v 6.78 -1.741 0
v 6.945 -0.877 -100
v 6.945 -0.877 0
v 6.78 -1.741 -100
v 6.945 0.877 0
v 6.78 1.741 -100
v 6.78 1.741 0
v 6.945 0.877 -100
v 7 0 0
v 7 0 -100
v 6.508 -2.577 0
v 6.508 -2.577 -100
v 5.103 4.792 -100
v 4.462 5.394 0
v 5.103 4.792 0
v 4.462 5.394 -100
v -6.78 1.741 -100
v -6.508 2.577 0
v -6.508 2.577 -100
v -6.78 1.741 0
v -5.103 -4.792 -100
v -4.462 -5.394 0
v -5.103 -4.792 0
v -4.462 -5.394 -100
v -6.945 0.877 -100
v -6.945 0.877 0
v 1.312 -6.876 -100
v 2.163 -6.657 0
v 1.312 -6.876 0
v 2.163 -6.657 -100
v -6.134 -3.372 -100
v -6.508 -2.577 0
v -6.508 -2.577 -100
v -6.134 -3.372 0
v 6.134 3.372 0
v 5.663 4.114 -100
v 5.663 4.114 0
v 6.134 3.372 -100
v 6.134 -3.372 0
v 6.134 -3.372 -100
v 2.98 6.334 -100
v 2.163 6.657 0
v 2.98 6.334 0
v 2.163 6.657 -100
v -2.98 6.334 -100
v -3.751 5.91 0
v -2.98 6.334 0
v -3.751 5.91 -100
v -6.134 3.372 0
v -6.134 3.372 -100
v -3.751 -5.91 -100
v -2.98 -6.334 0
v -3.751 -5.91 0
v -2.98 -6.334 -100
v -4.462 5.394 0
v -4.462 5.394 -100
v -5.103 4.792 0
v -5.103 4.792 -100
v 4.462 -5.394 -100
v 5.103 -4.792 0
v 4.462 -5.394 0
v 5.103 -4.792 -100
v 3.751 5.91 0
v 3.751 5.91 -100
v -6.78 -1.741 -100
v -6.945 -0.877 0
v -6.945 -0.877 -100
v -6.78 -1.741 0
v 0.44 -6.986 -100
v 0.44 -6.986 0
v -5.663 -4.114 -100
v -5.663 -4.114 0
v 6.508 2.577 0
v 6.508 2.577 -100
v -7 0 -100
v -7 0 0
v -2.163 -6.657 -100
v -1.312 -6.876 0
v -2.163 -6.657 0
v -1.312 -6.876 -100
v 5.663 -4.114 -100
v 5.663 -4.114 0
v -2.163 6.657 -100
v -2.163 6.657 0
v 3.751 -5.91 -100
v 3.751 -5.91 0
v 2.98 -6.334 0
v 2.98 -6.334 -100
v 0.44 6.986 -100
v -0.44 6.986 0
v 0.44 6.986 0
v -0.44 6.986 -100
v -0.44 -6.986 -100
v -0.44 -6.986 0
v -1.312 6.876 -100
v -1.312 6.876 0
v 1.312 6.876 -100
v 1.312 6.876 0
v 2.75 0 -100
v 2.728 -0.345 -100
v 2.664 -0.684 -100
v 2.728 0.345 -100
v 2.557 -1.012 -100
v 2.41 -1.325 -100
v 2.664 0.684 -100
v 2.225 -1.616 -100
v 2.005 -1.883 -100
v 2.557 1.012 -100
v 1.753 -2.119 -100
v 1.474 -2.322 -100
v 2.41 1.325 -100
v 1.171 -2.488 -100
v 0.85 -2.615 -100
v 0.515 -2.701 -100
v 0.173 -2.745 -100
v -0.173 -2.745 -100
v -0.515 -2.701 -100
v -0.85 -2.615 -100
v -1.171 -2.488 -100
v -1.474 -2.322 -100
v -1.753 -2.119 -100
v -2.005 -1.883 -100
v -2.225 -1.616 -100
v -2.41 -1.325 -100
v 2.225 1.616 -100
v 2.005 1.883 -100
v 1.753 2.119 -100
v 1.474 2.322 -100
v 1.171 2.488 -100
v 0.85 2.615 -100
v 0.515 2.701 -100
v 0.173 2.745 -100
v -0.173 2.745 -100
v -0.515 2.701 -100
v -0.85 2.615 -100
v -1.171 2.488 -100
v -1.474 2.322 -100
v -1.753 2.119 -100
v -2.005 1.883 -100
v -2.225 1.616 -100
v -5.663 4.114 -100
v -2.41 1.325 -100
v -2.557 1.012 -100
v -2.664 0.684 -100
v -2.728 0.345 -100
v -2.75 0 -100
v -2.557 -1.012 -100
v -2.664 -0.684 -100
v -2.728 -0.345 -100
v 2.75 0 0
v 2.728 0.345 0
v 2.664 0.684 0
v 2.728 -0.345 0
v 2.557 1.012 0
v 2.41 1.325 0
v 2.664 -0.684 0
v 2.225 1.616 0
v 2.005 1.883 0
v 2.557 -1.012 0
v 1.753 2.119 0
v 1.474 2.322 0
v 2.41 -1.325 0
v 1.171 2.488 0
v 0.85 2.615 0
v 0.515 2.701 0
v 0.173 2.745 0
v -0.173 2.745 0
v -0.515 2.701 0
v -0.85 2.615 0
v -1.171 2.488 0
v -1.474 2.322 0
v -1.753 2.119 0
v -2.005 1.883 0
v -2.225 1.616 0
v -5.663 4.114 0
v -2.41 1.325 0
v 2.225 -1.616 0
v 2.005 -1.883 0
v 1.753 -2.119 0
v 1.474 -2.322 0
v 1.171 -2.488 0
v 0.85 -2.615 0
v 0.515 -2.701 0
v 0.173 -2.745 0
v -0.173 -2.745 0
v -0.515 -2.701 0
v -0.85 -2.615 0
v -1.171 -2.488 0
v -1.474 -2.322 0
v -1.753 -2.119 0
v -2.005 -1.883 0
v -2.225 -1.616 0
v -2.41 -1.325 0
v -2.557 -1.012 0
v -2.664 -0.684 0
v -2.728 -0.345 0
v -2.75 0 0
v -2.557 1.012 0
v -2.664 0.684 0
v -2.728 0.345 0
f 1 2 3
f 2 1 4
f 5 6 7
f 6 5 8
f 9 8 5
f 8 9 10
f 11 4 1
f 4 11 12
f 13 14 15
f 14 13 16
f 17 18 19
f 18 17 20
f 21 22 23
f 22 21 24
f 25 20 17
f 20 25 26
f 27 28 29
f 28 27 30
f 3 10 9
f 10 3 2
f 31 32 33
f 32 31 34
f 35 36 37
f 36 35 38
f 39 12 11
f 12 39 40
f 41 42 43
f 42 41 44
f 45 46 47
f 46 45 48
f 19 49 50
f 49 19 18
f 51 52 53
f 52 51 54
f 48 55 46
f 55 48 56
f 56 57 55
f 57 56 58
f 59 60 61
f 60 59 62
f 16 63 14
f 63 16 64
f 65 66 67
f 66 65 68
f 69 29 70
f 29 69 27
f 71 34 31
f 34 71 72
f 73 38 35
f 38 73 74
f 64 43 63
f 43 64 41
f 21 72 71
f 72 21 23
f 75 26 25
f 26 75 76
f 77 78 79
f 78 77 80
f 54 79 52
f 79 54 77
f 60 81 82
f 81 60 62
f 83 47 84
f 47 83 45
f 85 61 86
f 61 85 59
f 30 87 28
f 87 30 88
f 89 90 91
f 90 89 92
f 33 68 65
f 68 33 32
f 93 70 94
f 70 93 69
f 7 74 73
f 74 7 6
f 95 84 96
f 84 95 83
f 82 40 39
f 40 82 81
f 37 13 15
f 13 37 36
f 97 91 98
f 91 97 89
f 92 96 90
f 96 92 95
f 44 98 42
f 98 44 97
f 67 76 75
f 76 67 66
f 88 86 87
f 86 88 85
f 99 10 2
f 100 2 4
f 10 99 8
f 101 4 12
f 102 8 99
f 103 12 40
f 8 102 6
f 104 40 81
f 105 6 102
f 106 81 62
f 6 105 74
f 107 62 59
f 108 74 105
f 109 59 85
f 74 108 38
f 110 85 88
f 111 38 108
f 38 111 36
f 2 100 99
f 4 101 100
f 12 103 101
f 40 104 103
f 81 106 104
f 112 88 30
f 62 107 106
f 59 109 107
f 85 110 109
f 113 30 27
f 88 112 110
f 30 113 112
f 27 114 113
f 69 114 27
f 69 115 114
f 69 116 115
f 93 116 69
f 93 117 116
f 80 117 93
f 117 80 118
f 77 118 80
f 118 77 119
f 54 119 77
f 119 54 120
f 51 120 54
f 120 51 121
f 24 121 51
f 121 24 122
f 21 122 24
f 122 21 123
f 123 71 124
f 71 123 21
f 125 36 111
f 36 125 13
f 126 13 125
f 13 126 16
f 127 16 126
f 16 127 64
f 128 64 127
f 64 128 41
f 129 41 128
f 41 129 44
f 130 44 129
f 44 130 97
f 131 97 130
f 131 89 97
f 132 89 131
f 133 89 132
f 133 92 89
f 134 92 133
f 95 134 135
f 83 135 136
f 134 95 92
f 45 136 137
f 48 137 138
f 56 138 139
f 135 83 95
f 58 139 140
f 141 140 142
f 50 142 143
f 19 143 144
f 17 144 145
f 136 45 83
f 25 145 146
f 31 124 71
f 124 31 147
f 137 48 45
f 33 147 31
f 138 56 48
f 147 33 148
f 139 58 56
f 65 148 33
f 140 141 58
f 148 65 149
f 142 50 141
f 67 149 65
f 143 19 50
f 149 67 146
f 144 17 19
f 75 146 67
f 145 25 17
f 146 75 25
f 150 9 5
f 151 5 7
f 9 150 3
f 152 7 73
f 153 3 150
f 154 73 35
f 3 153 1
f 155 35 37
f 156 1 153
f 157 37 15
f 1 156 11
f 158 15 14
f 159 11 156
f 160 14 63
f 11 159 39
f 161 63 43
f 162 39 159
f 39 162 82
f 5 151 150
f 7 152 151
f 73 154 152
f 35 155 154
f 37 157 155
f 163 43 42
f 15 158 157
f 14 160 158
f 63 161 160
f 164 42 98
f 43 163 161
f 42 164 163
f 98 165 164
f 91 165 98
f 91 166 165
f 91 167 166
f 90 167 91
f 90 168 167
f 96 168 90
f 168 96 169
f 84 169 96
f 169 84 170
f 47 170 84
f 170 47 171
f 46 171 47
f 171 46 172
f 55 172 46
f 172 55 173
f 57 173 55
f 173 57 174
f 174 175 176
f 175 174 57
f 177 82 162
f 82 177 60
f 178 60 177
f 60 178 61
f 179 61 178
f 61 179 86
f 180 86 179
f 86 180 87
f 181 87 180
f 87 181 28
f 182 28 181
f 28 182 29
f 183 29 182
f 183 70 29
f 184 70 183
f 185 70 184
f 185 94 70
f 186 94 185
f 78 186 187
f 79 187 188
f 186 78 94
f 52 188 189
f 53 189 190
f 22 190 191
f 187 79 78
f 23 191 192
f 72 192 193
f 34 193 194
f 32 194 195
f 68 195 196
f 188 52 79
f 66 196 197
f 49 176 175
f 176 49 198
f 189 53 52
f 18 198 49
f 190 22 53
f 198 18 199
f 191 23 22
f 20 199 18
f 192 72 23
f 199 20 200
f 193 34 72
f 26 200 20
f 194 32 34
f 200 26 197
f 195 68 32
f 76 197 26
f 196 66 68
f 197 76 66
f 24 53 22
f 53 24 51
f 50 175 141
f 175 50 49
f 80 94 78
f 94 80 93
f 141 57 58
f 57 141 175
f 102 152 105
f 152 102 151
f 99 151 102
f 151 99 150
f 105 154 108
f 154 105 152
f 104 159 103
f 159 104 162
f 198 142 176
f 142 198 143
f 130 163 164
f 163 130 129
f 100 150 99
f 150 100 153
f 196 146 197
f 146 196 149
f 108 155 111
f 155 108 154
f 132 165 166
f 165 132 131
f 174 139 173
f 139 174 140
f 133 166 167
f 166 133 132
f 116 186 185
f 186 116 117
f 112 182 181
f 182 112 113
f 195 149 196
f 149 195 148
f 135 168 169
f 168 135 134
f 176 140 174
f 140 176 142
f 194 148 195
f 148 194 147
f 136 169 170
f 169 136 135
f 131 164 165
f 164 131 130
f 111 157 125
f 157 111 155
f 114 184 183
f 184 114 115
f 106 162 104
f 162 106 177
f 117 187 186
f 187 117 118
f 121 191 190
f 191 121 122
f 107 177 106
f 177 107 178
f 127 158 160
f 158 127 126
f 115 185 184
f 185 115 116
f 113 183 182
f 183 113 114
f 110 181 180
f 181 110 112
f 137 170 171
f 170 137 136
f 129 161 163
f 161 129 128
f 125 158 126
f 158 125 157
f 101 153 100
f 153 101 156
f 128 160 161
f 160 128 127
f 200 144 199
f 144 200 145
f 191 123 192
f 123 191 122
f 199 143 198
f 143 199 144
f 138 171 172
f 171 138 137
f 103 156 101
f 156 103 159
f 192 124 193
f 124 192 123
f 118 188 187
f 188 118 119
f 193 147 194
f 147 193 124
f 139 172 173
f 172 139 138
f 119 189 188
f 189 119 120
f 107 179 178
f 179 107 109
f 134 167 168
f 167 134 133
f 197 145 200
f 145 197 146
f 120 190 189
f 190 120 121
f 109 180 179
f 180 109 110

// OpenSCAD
$fn = 50;


difference() {
	union() {
		translate(v = [0, 0, -100.0000000000]) {
			cylinder(h = 100, r = 7.0000000000);
		}
	}
	union() {
		#translate(v = [0, 0, -100]) {
			cylinder(h = 100, r = 2.7500000000);
		}
	}
}
